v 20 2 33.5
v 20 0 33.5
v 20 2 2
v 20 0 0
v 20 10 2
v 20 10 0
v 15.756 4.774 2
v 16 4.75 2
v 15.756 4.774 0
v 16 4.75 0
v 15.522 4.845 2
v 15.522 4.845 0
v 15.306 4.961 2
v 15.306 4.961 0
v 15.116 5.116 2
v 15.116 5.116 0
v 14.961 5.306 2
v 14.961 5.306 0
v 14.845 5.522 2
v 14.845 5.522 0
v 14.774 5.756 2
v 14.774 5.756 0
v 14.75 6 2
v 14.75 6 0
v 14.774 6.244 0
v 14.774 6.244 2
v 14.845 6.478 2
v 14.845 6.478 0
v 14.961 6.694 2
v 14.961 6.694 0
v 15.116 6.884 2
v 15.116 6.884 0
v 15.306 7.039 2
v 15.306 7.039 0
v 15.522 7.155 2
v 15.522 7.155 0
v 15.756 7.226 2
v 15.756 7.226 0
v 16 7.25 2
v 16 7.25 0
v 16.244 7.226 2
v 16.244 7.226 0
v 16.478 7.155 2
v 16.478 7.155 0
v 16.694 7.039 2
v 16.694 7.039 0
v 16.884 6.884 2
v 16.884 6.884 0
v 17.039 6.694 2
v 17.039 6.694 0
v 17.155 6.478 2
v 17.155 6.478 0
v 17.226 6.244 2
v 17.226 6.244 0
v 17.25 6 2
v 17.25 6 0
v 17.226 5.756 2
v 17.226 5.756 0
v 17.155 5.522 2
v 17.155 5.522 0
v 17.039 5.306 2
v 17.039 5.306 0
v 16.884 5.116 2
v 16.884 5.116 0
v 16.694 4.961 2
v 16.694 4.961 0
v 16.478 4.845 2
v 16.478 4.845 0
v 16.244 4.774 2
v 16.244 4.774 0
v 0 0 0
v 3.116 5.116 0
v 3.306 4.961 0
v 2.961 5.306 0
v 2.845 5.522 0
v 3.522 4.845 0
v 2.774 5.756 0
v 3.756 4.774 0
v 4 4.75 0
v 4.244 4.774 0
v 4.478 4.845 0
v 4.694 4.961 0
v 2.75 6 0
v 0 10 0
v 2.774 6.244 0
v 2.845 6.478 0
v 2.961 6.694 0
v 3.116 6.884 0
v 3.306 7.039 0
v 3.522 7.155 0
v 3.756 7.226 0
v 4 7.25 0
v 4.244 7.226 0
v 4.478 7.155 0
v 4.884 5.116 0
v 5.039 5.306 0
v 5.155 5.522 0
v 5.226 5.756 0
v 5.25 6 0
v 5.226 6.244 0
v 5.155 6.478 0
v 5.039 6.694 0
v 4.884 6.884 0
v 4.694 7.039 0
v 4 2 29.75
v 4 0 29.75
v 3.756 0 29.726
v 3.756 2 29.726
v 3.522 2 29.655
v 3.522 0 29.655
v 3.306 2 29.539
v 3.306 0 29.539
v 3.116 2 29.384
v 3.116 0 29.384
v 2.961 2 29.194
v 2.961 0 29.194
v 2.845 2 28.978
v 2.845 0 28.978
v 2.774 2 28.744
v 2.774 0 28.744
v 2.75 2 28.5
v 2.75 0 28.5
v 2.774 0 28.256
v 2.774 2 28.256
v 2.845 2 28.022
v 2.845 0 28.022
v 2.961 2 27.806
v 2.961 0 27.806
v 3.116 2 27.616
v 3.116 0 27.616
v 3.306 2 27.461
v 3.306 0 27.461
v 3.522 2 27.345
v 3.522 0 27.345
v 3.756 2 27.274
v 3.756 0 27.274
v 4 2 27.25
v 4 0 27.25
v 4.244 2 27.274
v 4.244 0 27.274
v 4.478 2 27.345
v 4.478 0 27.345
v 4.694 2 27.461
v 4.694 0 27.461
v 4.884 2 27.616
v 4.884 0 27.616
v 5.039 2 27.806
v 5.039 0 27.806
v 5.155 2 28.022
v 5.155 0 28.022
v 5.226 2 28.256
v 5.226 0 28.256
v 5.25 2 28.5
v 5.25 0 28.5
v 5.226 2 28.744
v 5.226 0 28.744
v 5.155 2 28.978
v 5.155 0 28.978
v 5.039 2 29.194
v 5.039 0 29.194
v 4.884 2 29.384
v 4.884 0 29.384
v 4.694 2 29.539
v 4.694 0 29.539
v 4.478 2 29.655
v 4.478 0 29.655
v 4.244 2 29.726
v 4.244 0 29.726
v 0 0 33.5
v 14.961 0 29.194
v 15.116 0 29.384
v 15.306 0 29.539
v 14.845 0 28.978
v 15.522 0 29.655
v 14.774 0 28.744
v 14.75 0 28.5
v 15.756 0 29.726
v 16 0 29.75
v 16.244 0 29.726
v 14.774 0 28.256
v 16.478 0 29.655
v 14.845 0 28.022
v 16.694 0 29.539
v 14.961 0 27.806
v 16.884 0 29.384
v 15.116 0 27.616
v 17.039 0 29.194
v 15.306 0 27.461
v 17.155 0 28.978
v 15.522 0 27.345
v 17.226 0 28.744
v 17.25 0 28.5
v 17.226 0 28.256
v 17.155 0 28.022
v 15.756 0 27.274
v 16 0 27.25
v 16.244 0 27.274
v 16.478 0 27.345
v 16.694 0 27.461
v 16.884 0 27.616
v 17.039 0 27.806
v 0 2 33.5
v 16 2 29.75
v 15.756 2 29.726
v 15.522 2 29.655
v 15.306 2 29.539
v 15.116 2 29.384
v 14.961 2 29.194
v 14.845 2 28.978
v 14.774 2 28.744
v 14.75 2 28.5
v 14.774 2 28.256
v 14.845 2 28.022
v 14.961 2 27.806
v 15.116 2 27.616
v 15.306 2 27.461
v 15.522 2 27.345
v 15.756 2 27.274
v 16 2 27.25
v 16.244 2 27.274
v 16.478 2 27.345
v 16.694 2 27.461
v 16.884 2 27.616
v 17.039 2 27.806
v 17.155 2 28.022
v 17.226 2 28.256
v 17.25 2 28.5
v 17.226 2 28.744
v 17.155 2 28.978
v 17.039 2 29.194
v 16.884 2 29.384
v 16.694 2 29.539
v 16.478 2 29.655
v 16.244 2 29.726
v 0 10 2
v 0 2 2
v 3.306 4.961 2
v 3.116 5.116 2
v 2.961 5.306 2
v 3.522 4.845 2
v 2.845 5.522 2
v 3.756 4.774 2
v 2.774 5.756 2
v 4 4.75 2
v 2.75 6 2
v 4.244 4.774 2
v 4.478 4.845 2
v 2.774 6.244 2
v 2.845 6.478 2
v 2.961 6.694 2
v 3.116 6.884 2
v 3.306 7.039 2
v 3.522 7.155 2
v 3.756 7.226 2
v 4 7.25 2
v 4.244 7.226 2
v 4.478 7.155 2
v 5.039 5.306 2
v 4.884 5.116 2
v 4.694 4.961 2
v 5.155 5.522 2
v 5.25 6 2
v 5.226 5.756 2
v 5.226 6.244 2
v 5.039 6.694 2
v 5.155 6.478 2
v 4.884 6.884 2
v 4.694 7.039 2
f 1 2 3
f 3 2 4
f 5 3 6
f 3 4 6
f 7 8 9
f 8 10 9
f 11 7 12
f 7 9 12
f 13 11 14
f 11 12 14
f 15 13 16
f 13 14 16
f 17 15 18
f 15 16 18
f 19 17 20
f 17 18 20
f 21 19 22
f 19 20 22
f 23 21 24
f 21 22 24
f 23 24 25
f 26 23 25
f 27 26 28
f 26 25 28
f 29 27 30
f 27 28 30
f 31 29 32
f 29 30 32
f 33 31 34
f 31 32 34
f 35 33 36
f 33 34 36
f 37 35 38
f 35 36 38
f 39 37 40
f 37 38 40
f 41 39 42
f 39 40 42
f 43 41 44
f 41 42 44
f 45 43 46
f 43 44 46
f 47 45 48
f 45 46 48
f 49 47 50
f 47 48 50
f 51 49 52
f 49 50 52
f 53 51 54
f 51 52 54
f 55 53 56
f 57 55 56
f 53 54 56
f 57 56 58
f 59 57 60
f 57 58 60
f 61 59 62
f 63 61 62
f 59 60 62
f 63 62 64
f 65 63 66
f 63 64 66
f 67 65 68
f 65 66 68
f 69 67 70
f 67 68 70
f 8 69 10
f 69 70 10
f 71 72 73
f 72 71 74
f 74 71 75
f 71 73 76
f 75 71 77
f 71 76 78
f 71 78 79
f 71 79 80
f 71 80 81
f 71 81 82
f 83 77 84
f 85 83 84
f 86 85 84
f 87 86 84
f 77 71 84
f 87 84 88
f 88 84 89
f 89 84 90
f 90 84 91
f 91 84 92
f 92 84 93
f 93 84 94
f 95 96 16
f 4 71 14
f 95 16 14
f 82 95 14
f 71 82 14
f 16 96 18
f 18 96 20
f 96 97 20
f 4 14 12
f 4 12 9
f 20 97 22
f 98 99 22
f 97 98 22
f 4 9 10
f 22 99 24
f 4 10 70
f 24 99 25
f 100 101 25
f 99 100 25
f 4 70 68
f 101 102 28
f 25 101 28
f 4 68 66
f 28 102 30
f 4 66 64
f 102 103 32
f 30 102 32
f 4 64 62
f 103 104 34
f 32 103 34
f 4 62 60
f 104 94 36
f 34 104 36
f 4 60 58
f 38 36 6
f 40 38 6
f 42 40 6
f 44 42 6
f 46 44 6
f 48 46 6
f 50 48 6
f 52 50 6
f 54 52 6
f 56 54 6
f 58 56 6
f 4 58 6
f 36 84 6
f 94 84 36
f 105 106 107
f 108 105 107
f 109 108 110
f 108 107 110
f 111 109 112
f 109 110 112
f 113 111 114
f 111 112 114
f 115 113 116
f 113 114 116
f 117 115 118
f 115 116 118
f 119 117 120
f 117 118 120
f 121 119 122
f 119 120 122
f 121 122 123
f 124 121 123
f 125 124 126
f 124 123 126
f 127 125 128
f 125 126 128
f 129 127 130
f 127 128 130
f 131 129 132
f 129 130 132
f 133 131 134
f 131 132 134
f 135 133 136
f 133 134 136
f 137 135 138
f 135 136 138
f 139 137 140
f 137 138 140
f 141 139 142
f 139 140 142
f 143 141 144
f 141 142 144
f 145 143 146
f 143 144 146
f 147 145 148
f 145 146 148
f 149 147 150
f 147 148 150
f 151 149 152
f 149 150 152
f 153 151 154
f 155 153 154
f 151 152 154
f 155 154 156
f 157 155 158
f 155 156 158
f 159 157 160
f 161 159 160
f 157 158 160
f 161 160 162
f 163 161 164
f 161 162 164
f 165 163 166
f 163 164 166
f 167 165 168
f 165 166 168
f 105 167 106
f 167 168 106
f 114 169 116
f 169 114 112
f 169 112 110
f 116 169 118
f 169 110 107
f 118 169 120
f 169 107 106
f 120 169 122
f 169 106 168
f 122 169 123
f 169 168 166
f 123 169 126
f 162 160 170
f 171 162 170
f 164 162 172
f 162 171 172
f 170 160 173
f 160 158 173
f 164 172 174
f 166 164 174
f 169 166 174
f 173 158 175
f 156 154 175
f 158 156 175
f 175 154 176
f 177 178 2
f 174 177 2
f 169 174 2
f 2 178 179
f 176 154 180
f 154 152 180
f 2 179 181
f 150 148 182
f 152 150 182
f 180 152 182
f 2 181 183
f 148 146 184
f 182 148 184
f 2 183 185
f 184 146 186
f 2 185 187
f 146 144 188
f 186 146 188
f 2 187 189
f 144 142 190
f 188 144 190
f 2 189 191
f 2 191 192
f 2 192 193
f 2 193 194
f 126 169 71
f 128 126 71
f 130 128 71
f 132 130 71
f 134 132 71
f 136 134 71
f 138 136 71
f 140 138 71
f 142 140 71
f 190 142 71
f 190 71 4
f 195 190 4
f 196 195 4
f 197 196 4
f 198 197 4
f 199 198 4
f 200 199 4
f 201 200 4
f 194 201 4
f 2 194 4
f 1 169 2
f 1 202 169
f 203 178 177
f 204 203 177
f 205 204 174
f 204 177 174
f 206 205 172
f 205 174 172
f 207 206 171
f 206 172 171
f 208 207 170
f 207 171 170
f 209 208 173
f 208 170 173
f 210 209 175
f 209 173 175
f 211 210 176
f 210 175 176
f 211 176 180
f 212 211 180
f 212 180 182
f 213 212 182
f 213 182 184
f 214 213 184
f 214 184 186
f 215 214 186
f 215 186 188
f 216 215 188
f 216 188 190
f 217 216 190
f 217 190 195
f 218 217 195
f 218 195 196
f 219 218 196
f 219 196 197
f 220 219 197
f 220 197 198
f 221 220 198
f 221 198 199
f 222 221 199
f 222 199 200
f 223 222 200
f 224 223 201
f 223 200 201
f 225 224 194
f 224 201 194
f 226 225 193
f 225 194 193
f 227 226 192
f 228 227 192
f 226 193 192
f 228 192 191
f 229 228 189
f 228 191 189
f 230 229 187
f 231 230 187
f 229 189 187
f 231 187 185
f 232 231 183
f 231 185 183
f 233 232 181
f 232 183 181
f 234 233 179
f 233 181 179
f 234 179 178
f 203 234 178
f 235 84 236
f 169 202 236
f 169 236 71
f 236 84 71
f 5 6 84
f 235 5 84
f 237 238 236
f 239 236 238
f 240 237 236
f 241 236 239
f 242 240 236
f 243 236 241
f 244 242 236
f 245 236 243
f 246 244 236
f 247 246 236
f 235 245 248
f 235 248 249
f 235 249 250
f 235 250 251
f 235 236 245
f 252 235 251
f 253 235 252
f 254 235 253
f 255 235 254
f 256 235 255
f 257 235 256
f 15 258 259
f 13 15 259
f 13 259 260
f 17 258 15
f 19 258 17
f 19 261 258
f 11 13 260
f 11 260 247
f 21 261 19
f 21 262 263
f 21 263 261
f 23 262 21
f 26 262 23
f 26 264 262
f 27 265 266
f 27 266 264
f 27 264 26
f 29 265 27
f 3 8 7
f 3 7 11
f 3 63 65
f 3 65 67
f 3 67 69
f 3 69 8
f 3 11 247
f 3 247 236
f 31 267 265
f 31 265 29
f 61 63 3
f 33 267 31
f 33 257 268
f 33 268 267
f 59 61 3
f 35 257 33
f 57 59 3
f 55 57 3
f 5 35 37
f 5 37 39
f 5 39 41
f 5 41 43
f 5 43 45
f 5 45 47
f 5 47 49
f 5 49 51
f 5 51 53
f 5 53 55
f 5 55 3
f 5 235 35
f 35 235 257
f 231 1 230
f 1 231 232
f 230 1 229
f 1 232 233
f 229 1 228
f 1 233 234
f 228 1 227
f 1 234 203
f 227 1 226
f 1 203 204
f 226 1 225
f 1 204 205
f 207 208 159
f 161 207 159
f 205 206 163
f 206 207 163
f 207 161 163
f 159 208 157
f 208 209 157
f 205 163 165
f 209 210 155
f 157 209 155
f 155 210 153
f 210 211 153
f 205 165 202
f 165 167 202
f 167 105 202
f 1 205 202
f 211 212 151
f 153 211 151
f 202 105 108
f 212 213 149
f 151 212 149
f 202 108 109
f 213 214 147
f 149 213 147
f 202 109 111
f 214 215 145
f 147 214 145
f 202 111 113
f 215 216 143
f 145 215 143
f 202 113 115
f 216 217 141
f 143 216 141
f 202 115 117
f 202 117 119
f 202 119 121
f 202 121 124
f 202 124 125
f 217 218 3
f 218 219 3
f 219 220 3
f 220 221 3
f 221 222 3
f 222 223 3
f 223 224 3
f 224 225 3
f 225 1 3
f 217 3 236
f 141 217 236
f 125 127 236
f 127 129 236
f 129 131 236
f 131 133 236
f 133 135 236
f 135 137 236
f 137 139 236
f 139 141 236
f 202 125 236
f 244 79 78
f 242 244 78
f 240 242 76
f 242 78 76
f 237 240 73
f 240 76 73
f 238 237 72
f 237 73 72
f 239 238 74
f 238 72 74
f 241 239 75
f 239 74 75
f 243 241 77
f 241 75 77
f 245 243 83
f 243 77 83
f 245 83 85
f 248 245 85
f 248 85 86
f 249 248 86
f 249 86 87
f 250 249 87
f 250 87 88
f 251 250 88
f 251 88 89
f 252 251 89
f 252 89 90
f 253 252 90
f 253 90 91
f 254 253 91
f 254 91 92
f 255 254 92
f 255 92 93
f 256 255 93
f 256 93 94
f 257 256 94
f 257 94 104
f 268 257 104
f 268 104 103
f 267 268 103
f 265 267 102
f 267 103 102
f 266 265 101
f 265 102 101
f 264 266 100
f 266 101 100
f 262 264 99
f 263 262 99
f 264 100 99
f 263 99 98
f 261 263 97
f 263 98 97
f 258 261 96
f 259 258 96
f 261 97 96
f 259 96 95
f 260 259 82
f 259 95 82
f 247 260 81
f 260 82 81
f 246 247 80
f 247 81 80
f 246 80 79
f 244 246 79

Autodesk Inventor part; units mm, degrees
ref_plane "YZ Plane" through (0, 0, 0) normal (1, 0, 0) x (0, 1, 0)
ref_plane "XZ Plane" through (0, 0, 0) normal (0, 1, 0) x (-1, 0, 0)
ref_plane "XY Plane" through (0, 0, 0) normal (0, 0, 1) x (1, 0, 0)
sketch "スケッチ1" plane through (0, 0, 0) normal (0, 0, 1) x (1, 0, 0)
  line L0 (0, 0) -> (20, 0)
  line L1 (20, 0) -> (20, 10)
  line L2 (20, 10) -> (0, 10)
  line L3 (0, 10) -> (0, 0)
  dimension "d0" = 10
  dimension "d1" = 20
extrude "押し出し1" add sketch "スケッチ1" along normal blind 2
sketch "スケッチ2" plane through (0, 0, 2) normal (0, 0, 1) x (1, 0, 0)
  line L0 (0, 10) -> (0, 0) projected
  line L1 (20, 0) -> (20, 10) projected
  line L2 (0, 0) -> (20, 0)
  line L3 (20, 0) -> (20, 2)
  line L4 (20, 2) -> (0, 2)
  line L5 (0, 2) -> (0, 0)
  point P0 (0, 2)
  dimension "d4" = 2
extrude "押し出し2" add sketch "スケッチ2" along normal blind 31.5
sketch "スケッチ3" plane through (0, 0, 2) normal (0, 0, 1) x (1, 0, 0)
  line L0 (20, 2) -> (0, 2) projected
  line L1 (0, 0) -> (20, 0) projected
  line L2 (0, 10) -> (0, 2) projected
  point P0 (16, 6)
  point P1 (4, 6)
  dimension "d8" = 6
  dimension "d9" = 6
  dimension "d10" = 4
  dimension "d11" = 12
hole "穴1" at (16, 6, 2) at (4, 6, 2) direction (0, 0, -1) diameter 2.5 depth 25 tip angle 118
sketch "スケッチ4" plane through (0, 2, 2) normal (0, 1, 0) x (1, 0, 0)
  line L0 (20, -31.5) -> (0, -31.5) projected
  line L1 (0, 0) -> (0, -31.5) projected
  point P0 (0, 2)
  point P1 (4, -26.5)
  point P2 (16, -26.5)
  dimension "d19" = 5
  dimension "d20" = 5
  dimension "d21" = 12
  dimension "d22" = 4
hole "穴2" at (4, 2, 28.5) at (16, 2, 28.5) direction (0, -1, 0) diameter 2.5 depth 25 tip angle 118
properties part number "シリンダ固定"
